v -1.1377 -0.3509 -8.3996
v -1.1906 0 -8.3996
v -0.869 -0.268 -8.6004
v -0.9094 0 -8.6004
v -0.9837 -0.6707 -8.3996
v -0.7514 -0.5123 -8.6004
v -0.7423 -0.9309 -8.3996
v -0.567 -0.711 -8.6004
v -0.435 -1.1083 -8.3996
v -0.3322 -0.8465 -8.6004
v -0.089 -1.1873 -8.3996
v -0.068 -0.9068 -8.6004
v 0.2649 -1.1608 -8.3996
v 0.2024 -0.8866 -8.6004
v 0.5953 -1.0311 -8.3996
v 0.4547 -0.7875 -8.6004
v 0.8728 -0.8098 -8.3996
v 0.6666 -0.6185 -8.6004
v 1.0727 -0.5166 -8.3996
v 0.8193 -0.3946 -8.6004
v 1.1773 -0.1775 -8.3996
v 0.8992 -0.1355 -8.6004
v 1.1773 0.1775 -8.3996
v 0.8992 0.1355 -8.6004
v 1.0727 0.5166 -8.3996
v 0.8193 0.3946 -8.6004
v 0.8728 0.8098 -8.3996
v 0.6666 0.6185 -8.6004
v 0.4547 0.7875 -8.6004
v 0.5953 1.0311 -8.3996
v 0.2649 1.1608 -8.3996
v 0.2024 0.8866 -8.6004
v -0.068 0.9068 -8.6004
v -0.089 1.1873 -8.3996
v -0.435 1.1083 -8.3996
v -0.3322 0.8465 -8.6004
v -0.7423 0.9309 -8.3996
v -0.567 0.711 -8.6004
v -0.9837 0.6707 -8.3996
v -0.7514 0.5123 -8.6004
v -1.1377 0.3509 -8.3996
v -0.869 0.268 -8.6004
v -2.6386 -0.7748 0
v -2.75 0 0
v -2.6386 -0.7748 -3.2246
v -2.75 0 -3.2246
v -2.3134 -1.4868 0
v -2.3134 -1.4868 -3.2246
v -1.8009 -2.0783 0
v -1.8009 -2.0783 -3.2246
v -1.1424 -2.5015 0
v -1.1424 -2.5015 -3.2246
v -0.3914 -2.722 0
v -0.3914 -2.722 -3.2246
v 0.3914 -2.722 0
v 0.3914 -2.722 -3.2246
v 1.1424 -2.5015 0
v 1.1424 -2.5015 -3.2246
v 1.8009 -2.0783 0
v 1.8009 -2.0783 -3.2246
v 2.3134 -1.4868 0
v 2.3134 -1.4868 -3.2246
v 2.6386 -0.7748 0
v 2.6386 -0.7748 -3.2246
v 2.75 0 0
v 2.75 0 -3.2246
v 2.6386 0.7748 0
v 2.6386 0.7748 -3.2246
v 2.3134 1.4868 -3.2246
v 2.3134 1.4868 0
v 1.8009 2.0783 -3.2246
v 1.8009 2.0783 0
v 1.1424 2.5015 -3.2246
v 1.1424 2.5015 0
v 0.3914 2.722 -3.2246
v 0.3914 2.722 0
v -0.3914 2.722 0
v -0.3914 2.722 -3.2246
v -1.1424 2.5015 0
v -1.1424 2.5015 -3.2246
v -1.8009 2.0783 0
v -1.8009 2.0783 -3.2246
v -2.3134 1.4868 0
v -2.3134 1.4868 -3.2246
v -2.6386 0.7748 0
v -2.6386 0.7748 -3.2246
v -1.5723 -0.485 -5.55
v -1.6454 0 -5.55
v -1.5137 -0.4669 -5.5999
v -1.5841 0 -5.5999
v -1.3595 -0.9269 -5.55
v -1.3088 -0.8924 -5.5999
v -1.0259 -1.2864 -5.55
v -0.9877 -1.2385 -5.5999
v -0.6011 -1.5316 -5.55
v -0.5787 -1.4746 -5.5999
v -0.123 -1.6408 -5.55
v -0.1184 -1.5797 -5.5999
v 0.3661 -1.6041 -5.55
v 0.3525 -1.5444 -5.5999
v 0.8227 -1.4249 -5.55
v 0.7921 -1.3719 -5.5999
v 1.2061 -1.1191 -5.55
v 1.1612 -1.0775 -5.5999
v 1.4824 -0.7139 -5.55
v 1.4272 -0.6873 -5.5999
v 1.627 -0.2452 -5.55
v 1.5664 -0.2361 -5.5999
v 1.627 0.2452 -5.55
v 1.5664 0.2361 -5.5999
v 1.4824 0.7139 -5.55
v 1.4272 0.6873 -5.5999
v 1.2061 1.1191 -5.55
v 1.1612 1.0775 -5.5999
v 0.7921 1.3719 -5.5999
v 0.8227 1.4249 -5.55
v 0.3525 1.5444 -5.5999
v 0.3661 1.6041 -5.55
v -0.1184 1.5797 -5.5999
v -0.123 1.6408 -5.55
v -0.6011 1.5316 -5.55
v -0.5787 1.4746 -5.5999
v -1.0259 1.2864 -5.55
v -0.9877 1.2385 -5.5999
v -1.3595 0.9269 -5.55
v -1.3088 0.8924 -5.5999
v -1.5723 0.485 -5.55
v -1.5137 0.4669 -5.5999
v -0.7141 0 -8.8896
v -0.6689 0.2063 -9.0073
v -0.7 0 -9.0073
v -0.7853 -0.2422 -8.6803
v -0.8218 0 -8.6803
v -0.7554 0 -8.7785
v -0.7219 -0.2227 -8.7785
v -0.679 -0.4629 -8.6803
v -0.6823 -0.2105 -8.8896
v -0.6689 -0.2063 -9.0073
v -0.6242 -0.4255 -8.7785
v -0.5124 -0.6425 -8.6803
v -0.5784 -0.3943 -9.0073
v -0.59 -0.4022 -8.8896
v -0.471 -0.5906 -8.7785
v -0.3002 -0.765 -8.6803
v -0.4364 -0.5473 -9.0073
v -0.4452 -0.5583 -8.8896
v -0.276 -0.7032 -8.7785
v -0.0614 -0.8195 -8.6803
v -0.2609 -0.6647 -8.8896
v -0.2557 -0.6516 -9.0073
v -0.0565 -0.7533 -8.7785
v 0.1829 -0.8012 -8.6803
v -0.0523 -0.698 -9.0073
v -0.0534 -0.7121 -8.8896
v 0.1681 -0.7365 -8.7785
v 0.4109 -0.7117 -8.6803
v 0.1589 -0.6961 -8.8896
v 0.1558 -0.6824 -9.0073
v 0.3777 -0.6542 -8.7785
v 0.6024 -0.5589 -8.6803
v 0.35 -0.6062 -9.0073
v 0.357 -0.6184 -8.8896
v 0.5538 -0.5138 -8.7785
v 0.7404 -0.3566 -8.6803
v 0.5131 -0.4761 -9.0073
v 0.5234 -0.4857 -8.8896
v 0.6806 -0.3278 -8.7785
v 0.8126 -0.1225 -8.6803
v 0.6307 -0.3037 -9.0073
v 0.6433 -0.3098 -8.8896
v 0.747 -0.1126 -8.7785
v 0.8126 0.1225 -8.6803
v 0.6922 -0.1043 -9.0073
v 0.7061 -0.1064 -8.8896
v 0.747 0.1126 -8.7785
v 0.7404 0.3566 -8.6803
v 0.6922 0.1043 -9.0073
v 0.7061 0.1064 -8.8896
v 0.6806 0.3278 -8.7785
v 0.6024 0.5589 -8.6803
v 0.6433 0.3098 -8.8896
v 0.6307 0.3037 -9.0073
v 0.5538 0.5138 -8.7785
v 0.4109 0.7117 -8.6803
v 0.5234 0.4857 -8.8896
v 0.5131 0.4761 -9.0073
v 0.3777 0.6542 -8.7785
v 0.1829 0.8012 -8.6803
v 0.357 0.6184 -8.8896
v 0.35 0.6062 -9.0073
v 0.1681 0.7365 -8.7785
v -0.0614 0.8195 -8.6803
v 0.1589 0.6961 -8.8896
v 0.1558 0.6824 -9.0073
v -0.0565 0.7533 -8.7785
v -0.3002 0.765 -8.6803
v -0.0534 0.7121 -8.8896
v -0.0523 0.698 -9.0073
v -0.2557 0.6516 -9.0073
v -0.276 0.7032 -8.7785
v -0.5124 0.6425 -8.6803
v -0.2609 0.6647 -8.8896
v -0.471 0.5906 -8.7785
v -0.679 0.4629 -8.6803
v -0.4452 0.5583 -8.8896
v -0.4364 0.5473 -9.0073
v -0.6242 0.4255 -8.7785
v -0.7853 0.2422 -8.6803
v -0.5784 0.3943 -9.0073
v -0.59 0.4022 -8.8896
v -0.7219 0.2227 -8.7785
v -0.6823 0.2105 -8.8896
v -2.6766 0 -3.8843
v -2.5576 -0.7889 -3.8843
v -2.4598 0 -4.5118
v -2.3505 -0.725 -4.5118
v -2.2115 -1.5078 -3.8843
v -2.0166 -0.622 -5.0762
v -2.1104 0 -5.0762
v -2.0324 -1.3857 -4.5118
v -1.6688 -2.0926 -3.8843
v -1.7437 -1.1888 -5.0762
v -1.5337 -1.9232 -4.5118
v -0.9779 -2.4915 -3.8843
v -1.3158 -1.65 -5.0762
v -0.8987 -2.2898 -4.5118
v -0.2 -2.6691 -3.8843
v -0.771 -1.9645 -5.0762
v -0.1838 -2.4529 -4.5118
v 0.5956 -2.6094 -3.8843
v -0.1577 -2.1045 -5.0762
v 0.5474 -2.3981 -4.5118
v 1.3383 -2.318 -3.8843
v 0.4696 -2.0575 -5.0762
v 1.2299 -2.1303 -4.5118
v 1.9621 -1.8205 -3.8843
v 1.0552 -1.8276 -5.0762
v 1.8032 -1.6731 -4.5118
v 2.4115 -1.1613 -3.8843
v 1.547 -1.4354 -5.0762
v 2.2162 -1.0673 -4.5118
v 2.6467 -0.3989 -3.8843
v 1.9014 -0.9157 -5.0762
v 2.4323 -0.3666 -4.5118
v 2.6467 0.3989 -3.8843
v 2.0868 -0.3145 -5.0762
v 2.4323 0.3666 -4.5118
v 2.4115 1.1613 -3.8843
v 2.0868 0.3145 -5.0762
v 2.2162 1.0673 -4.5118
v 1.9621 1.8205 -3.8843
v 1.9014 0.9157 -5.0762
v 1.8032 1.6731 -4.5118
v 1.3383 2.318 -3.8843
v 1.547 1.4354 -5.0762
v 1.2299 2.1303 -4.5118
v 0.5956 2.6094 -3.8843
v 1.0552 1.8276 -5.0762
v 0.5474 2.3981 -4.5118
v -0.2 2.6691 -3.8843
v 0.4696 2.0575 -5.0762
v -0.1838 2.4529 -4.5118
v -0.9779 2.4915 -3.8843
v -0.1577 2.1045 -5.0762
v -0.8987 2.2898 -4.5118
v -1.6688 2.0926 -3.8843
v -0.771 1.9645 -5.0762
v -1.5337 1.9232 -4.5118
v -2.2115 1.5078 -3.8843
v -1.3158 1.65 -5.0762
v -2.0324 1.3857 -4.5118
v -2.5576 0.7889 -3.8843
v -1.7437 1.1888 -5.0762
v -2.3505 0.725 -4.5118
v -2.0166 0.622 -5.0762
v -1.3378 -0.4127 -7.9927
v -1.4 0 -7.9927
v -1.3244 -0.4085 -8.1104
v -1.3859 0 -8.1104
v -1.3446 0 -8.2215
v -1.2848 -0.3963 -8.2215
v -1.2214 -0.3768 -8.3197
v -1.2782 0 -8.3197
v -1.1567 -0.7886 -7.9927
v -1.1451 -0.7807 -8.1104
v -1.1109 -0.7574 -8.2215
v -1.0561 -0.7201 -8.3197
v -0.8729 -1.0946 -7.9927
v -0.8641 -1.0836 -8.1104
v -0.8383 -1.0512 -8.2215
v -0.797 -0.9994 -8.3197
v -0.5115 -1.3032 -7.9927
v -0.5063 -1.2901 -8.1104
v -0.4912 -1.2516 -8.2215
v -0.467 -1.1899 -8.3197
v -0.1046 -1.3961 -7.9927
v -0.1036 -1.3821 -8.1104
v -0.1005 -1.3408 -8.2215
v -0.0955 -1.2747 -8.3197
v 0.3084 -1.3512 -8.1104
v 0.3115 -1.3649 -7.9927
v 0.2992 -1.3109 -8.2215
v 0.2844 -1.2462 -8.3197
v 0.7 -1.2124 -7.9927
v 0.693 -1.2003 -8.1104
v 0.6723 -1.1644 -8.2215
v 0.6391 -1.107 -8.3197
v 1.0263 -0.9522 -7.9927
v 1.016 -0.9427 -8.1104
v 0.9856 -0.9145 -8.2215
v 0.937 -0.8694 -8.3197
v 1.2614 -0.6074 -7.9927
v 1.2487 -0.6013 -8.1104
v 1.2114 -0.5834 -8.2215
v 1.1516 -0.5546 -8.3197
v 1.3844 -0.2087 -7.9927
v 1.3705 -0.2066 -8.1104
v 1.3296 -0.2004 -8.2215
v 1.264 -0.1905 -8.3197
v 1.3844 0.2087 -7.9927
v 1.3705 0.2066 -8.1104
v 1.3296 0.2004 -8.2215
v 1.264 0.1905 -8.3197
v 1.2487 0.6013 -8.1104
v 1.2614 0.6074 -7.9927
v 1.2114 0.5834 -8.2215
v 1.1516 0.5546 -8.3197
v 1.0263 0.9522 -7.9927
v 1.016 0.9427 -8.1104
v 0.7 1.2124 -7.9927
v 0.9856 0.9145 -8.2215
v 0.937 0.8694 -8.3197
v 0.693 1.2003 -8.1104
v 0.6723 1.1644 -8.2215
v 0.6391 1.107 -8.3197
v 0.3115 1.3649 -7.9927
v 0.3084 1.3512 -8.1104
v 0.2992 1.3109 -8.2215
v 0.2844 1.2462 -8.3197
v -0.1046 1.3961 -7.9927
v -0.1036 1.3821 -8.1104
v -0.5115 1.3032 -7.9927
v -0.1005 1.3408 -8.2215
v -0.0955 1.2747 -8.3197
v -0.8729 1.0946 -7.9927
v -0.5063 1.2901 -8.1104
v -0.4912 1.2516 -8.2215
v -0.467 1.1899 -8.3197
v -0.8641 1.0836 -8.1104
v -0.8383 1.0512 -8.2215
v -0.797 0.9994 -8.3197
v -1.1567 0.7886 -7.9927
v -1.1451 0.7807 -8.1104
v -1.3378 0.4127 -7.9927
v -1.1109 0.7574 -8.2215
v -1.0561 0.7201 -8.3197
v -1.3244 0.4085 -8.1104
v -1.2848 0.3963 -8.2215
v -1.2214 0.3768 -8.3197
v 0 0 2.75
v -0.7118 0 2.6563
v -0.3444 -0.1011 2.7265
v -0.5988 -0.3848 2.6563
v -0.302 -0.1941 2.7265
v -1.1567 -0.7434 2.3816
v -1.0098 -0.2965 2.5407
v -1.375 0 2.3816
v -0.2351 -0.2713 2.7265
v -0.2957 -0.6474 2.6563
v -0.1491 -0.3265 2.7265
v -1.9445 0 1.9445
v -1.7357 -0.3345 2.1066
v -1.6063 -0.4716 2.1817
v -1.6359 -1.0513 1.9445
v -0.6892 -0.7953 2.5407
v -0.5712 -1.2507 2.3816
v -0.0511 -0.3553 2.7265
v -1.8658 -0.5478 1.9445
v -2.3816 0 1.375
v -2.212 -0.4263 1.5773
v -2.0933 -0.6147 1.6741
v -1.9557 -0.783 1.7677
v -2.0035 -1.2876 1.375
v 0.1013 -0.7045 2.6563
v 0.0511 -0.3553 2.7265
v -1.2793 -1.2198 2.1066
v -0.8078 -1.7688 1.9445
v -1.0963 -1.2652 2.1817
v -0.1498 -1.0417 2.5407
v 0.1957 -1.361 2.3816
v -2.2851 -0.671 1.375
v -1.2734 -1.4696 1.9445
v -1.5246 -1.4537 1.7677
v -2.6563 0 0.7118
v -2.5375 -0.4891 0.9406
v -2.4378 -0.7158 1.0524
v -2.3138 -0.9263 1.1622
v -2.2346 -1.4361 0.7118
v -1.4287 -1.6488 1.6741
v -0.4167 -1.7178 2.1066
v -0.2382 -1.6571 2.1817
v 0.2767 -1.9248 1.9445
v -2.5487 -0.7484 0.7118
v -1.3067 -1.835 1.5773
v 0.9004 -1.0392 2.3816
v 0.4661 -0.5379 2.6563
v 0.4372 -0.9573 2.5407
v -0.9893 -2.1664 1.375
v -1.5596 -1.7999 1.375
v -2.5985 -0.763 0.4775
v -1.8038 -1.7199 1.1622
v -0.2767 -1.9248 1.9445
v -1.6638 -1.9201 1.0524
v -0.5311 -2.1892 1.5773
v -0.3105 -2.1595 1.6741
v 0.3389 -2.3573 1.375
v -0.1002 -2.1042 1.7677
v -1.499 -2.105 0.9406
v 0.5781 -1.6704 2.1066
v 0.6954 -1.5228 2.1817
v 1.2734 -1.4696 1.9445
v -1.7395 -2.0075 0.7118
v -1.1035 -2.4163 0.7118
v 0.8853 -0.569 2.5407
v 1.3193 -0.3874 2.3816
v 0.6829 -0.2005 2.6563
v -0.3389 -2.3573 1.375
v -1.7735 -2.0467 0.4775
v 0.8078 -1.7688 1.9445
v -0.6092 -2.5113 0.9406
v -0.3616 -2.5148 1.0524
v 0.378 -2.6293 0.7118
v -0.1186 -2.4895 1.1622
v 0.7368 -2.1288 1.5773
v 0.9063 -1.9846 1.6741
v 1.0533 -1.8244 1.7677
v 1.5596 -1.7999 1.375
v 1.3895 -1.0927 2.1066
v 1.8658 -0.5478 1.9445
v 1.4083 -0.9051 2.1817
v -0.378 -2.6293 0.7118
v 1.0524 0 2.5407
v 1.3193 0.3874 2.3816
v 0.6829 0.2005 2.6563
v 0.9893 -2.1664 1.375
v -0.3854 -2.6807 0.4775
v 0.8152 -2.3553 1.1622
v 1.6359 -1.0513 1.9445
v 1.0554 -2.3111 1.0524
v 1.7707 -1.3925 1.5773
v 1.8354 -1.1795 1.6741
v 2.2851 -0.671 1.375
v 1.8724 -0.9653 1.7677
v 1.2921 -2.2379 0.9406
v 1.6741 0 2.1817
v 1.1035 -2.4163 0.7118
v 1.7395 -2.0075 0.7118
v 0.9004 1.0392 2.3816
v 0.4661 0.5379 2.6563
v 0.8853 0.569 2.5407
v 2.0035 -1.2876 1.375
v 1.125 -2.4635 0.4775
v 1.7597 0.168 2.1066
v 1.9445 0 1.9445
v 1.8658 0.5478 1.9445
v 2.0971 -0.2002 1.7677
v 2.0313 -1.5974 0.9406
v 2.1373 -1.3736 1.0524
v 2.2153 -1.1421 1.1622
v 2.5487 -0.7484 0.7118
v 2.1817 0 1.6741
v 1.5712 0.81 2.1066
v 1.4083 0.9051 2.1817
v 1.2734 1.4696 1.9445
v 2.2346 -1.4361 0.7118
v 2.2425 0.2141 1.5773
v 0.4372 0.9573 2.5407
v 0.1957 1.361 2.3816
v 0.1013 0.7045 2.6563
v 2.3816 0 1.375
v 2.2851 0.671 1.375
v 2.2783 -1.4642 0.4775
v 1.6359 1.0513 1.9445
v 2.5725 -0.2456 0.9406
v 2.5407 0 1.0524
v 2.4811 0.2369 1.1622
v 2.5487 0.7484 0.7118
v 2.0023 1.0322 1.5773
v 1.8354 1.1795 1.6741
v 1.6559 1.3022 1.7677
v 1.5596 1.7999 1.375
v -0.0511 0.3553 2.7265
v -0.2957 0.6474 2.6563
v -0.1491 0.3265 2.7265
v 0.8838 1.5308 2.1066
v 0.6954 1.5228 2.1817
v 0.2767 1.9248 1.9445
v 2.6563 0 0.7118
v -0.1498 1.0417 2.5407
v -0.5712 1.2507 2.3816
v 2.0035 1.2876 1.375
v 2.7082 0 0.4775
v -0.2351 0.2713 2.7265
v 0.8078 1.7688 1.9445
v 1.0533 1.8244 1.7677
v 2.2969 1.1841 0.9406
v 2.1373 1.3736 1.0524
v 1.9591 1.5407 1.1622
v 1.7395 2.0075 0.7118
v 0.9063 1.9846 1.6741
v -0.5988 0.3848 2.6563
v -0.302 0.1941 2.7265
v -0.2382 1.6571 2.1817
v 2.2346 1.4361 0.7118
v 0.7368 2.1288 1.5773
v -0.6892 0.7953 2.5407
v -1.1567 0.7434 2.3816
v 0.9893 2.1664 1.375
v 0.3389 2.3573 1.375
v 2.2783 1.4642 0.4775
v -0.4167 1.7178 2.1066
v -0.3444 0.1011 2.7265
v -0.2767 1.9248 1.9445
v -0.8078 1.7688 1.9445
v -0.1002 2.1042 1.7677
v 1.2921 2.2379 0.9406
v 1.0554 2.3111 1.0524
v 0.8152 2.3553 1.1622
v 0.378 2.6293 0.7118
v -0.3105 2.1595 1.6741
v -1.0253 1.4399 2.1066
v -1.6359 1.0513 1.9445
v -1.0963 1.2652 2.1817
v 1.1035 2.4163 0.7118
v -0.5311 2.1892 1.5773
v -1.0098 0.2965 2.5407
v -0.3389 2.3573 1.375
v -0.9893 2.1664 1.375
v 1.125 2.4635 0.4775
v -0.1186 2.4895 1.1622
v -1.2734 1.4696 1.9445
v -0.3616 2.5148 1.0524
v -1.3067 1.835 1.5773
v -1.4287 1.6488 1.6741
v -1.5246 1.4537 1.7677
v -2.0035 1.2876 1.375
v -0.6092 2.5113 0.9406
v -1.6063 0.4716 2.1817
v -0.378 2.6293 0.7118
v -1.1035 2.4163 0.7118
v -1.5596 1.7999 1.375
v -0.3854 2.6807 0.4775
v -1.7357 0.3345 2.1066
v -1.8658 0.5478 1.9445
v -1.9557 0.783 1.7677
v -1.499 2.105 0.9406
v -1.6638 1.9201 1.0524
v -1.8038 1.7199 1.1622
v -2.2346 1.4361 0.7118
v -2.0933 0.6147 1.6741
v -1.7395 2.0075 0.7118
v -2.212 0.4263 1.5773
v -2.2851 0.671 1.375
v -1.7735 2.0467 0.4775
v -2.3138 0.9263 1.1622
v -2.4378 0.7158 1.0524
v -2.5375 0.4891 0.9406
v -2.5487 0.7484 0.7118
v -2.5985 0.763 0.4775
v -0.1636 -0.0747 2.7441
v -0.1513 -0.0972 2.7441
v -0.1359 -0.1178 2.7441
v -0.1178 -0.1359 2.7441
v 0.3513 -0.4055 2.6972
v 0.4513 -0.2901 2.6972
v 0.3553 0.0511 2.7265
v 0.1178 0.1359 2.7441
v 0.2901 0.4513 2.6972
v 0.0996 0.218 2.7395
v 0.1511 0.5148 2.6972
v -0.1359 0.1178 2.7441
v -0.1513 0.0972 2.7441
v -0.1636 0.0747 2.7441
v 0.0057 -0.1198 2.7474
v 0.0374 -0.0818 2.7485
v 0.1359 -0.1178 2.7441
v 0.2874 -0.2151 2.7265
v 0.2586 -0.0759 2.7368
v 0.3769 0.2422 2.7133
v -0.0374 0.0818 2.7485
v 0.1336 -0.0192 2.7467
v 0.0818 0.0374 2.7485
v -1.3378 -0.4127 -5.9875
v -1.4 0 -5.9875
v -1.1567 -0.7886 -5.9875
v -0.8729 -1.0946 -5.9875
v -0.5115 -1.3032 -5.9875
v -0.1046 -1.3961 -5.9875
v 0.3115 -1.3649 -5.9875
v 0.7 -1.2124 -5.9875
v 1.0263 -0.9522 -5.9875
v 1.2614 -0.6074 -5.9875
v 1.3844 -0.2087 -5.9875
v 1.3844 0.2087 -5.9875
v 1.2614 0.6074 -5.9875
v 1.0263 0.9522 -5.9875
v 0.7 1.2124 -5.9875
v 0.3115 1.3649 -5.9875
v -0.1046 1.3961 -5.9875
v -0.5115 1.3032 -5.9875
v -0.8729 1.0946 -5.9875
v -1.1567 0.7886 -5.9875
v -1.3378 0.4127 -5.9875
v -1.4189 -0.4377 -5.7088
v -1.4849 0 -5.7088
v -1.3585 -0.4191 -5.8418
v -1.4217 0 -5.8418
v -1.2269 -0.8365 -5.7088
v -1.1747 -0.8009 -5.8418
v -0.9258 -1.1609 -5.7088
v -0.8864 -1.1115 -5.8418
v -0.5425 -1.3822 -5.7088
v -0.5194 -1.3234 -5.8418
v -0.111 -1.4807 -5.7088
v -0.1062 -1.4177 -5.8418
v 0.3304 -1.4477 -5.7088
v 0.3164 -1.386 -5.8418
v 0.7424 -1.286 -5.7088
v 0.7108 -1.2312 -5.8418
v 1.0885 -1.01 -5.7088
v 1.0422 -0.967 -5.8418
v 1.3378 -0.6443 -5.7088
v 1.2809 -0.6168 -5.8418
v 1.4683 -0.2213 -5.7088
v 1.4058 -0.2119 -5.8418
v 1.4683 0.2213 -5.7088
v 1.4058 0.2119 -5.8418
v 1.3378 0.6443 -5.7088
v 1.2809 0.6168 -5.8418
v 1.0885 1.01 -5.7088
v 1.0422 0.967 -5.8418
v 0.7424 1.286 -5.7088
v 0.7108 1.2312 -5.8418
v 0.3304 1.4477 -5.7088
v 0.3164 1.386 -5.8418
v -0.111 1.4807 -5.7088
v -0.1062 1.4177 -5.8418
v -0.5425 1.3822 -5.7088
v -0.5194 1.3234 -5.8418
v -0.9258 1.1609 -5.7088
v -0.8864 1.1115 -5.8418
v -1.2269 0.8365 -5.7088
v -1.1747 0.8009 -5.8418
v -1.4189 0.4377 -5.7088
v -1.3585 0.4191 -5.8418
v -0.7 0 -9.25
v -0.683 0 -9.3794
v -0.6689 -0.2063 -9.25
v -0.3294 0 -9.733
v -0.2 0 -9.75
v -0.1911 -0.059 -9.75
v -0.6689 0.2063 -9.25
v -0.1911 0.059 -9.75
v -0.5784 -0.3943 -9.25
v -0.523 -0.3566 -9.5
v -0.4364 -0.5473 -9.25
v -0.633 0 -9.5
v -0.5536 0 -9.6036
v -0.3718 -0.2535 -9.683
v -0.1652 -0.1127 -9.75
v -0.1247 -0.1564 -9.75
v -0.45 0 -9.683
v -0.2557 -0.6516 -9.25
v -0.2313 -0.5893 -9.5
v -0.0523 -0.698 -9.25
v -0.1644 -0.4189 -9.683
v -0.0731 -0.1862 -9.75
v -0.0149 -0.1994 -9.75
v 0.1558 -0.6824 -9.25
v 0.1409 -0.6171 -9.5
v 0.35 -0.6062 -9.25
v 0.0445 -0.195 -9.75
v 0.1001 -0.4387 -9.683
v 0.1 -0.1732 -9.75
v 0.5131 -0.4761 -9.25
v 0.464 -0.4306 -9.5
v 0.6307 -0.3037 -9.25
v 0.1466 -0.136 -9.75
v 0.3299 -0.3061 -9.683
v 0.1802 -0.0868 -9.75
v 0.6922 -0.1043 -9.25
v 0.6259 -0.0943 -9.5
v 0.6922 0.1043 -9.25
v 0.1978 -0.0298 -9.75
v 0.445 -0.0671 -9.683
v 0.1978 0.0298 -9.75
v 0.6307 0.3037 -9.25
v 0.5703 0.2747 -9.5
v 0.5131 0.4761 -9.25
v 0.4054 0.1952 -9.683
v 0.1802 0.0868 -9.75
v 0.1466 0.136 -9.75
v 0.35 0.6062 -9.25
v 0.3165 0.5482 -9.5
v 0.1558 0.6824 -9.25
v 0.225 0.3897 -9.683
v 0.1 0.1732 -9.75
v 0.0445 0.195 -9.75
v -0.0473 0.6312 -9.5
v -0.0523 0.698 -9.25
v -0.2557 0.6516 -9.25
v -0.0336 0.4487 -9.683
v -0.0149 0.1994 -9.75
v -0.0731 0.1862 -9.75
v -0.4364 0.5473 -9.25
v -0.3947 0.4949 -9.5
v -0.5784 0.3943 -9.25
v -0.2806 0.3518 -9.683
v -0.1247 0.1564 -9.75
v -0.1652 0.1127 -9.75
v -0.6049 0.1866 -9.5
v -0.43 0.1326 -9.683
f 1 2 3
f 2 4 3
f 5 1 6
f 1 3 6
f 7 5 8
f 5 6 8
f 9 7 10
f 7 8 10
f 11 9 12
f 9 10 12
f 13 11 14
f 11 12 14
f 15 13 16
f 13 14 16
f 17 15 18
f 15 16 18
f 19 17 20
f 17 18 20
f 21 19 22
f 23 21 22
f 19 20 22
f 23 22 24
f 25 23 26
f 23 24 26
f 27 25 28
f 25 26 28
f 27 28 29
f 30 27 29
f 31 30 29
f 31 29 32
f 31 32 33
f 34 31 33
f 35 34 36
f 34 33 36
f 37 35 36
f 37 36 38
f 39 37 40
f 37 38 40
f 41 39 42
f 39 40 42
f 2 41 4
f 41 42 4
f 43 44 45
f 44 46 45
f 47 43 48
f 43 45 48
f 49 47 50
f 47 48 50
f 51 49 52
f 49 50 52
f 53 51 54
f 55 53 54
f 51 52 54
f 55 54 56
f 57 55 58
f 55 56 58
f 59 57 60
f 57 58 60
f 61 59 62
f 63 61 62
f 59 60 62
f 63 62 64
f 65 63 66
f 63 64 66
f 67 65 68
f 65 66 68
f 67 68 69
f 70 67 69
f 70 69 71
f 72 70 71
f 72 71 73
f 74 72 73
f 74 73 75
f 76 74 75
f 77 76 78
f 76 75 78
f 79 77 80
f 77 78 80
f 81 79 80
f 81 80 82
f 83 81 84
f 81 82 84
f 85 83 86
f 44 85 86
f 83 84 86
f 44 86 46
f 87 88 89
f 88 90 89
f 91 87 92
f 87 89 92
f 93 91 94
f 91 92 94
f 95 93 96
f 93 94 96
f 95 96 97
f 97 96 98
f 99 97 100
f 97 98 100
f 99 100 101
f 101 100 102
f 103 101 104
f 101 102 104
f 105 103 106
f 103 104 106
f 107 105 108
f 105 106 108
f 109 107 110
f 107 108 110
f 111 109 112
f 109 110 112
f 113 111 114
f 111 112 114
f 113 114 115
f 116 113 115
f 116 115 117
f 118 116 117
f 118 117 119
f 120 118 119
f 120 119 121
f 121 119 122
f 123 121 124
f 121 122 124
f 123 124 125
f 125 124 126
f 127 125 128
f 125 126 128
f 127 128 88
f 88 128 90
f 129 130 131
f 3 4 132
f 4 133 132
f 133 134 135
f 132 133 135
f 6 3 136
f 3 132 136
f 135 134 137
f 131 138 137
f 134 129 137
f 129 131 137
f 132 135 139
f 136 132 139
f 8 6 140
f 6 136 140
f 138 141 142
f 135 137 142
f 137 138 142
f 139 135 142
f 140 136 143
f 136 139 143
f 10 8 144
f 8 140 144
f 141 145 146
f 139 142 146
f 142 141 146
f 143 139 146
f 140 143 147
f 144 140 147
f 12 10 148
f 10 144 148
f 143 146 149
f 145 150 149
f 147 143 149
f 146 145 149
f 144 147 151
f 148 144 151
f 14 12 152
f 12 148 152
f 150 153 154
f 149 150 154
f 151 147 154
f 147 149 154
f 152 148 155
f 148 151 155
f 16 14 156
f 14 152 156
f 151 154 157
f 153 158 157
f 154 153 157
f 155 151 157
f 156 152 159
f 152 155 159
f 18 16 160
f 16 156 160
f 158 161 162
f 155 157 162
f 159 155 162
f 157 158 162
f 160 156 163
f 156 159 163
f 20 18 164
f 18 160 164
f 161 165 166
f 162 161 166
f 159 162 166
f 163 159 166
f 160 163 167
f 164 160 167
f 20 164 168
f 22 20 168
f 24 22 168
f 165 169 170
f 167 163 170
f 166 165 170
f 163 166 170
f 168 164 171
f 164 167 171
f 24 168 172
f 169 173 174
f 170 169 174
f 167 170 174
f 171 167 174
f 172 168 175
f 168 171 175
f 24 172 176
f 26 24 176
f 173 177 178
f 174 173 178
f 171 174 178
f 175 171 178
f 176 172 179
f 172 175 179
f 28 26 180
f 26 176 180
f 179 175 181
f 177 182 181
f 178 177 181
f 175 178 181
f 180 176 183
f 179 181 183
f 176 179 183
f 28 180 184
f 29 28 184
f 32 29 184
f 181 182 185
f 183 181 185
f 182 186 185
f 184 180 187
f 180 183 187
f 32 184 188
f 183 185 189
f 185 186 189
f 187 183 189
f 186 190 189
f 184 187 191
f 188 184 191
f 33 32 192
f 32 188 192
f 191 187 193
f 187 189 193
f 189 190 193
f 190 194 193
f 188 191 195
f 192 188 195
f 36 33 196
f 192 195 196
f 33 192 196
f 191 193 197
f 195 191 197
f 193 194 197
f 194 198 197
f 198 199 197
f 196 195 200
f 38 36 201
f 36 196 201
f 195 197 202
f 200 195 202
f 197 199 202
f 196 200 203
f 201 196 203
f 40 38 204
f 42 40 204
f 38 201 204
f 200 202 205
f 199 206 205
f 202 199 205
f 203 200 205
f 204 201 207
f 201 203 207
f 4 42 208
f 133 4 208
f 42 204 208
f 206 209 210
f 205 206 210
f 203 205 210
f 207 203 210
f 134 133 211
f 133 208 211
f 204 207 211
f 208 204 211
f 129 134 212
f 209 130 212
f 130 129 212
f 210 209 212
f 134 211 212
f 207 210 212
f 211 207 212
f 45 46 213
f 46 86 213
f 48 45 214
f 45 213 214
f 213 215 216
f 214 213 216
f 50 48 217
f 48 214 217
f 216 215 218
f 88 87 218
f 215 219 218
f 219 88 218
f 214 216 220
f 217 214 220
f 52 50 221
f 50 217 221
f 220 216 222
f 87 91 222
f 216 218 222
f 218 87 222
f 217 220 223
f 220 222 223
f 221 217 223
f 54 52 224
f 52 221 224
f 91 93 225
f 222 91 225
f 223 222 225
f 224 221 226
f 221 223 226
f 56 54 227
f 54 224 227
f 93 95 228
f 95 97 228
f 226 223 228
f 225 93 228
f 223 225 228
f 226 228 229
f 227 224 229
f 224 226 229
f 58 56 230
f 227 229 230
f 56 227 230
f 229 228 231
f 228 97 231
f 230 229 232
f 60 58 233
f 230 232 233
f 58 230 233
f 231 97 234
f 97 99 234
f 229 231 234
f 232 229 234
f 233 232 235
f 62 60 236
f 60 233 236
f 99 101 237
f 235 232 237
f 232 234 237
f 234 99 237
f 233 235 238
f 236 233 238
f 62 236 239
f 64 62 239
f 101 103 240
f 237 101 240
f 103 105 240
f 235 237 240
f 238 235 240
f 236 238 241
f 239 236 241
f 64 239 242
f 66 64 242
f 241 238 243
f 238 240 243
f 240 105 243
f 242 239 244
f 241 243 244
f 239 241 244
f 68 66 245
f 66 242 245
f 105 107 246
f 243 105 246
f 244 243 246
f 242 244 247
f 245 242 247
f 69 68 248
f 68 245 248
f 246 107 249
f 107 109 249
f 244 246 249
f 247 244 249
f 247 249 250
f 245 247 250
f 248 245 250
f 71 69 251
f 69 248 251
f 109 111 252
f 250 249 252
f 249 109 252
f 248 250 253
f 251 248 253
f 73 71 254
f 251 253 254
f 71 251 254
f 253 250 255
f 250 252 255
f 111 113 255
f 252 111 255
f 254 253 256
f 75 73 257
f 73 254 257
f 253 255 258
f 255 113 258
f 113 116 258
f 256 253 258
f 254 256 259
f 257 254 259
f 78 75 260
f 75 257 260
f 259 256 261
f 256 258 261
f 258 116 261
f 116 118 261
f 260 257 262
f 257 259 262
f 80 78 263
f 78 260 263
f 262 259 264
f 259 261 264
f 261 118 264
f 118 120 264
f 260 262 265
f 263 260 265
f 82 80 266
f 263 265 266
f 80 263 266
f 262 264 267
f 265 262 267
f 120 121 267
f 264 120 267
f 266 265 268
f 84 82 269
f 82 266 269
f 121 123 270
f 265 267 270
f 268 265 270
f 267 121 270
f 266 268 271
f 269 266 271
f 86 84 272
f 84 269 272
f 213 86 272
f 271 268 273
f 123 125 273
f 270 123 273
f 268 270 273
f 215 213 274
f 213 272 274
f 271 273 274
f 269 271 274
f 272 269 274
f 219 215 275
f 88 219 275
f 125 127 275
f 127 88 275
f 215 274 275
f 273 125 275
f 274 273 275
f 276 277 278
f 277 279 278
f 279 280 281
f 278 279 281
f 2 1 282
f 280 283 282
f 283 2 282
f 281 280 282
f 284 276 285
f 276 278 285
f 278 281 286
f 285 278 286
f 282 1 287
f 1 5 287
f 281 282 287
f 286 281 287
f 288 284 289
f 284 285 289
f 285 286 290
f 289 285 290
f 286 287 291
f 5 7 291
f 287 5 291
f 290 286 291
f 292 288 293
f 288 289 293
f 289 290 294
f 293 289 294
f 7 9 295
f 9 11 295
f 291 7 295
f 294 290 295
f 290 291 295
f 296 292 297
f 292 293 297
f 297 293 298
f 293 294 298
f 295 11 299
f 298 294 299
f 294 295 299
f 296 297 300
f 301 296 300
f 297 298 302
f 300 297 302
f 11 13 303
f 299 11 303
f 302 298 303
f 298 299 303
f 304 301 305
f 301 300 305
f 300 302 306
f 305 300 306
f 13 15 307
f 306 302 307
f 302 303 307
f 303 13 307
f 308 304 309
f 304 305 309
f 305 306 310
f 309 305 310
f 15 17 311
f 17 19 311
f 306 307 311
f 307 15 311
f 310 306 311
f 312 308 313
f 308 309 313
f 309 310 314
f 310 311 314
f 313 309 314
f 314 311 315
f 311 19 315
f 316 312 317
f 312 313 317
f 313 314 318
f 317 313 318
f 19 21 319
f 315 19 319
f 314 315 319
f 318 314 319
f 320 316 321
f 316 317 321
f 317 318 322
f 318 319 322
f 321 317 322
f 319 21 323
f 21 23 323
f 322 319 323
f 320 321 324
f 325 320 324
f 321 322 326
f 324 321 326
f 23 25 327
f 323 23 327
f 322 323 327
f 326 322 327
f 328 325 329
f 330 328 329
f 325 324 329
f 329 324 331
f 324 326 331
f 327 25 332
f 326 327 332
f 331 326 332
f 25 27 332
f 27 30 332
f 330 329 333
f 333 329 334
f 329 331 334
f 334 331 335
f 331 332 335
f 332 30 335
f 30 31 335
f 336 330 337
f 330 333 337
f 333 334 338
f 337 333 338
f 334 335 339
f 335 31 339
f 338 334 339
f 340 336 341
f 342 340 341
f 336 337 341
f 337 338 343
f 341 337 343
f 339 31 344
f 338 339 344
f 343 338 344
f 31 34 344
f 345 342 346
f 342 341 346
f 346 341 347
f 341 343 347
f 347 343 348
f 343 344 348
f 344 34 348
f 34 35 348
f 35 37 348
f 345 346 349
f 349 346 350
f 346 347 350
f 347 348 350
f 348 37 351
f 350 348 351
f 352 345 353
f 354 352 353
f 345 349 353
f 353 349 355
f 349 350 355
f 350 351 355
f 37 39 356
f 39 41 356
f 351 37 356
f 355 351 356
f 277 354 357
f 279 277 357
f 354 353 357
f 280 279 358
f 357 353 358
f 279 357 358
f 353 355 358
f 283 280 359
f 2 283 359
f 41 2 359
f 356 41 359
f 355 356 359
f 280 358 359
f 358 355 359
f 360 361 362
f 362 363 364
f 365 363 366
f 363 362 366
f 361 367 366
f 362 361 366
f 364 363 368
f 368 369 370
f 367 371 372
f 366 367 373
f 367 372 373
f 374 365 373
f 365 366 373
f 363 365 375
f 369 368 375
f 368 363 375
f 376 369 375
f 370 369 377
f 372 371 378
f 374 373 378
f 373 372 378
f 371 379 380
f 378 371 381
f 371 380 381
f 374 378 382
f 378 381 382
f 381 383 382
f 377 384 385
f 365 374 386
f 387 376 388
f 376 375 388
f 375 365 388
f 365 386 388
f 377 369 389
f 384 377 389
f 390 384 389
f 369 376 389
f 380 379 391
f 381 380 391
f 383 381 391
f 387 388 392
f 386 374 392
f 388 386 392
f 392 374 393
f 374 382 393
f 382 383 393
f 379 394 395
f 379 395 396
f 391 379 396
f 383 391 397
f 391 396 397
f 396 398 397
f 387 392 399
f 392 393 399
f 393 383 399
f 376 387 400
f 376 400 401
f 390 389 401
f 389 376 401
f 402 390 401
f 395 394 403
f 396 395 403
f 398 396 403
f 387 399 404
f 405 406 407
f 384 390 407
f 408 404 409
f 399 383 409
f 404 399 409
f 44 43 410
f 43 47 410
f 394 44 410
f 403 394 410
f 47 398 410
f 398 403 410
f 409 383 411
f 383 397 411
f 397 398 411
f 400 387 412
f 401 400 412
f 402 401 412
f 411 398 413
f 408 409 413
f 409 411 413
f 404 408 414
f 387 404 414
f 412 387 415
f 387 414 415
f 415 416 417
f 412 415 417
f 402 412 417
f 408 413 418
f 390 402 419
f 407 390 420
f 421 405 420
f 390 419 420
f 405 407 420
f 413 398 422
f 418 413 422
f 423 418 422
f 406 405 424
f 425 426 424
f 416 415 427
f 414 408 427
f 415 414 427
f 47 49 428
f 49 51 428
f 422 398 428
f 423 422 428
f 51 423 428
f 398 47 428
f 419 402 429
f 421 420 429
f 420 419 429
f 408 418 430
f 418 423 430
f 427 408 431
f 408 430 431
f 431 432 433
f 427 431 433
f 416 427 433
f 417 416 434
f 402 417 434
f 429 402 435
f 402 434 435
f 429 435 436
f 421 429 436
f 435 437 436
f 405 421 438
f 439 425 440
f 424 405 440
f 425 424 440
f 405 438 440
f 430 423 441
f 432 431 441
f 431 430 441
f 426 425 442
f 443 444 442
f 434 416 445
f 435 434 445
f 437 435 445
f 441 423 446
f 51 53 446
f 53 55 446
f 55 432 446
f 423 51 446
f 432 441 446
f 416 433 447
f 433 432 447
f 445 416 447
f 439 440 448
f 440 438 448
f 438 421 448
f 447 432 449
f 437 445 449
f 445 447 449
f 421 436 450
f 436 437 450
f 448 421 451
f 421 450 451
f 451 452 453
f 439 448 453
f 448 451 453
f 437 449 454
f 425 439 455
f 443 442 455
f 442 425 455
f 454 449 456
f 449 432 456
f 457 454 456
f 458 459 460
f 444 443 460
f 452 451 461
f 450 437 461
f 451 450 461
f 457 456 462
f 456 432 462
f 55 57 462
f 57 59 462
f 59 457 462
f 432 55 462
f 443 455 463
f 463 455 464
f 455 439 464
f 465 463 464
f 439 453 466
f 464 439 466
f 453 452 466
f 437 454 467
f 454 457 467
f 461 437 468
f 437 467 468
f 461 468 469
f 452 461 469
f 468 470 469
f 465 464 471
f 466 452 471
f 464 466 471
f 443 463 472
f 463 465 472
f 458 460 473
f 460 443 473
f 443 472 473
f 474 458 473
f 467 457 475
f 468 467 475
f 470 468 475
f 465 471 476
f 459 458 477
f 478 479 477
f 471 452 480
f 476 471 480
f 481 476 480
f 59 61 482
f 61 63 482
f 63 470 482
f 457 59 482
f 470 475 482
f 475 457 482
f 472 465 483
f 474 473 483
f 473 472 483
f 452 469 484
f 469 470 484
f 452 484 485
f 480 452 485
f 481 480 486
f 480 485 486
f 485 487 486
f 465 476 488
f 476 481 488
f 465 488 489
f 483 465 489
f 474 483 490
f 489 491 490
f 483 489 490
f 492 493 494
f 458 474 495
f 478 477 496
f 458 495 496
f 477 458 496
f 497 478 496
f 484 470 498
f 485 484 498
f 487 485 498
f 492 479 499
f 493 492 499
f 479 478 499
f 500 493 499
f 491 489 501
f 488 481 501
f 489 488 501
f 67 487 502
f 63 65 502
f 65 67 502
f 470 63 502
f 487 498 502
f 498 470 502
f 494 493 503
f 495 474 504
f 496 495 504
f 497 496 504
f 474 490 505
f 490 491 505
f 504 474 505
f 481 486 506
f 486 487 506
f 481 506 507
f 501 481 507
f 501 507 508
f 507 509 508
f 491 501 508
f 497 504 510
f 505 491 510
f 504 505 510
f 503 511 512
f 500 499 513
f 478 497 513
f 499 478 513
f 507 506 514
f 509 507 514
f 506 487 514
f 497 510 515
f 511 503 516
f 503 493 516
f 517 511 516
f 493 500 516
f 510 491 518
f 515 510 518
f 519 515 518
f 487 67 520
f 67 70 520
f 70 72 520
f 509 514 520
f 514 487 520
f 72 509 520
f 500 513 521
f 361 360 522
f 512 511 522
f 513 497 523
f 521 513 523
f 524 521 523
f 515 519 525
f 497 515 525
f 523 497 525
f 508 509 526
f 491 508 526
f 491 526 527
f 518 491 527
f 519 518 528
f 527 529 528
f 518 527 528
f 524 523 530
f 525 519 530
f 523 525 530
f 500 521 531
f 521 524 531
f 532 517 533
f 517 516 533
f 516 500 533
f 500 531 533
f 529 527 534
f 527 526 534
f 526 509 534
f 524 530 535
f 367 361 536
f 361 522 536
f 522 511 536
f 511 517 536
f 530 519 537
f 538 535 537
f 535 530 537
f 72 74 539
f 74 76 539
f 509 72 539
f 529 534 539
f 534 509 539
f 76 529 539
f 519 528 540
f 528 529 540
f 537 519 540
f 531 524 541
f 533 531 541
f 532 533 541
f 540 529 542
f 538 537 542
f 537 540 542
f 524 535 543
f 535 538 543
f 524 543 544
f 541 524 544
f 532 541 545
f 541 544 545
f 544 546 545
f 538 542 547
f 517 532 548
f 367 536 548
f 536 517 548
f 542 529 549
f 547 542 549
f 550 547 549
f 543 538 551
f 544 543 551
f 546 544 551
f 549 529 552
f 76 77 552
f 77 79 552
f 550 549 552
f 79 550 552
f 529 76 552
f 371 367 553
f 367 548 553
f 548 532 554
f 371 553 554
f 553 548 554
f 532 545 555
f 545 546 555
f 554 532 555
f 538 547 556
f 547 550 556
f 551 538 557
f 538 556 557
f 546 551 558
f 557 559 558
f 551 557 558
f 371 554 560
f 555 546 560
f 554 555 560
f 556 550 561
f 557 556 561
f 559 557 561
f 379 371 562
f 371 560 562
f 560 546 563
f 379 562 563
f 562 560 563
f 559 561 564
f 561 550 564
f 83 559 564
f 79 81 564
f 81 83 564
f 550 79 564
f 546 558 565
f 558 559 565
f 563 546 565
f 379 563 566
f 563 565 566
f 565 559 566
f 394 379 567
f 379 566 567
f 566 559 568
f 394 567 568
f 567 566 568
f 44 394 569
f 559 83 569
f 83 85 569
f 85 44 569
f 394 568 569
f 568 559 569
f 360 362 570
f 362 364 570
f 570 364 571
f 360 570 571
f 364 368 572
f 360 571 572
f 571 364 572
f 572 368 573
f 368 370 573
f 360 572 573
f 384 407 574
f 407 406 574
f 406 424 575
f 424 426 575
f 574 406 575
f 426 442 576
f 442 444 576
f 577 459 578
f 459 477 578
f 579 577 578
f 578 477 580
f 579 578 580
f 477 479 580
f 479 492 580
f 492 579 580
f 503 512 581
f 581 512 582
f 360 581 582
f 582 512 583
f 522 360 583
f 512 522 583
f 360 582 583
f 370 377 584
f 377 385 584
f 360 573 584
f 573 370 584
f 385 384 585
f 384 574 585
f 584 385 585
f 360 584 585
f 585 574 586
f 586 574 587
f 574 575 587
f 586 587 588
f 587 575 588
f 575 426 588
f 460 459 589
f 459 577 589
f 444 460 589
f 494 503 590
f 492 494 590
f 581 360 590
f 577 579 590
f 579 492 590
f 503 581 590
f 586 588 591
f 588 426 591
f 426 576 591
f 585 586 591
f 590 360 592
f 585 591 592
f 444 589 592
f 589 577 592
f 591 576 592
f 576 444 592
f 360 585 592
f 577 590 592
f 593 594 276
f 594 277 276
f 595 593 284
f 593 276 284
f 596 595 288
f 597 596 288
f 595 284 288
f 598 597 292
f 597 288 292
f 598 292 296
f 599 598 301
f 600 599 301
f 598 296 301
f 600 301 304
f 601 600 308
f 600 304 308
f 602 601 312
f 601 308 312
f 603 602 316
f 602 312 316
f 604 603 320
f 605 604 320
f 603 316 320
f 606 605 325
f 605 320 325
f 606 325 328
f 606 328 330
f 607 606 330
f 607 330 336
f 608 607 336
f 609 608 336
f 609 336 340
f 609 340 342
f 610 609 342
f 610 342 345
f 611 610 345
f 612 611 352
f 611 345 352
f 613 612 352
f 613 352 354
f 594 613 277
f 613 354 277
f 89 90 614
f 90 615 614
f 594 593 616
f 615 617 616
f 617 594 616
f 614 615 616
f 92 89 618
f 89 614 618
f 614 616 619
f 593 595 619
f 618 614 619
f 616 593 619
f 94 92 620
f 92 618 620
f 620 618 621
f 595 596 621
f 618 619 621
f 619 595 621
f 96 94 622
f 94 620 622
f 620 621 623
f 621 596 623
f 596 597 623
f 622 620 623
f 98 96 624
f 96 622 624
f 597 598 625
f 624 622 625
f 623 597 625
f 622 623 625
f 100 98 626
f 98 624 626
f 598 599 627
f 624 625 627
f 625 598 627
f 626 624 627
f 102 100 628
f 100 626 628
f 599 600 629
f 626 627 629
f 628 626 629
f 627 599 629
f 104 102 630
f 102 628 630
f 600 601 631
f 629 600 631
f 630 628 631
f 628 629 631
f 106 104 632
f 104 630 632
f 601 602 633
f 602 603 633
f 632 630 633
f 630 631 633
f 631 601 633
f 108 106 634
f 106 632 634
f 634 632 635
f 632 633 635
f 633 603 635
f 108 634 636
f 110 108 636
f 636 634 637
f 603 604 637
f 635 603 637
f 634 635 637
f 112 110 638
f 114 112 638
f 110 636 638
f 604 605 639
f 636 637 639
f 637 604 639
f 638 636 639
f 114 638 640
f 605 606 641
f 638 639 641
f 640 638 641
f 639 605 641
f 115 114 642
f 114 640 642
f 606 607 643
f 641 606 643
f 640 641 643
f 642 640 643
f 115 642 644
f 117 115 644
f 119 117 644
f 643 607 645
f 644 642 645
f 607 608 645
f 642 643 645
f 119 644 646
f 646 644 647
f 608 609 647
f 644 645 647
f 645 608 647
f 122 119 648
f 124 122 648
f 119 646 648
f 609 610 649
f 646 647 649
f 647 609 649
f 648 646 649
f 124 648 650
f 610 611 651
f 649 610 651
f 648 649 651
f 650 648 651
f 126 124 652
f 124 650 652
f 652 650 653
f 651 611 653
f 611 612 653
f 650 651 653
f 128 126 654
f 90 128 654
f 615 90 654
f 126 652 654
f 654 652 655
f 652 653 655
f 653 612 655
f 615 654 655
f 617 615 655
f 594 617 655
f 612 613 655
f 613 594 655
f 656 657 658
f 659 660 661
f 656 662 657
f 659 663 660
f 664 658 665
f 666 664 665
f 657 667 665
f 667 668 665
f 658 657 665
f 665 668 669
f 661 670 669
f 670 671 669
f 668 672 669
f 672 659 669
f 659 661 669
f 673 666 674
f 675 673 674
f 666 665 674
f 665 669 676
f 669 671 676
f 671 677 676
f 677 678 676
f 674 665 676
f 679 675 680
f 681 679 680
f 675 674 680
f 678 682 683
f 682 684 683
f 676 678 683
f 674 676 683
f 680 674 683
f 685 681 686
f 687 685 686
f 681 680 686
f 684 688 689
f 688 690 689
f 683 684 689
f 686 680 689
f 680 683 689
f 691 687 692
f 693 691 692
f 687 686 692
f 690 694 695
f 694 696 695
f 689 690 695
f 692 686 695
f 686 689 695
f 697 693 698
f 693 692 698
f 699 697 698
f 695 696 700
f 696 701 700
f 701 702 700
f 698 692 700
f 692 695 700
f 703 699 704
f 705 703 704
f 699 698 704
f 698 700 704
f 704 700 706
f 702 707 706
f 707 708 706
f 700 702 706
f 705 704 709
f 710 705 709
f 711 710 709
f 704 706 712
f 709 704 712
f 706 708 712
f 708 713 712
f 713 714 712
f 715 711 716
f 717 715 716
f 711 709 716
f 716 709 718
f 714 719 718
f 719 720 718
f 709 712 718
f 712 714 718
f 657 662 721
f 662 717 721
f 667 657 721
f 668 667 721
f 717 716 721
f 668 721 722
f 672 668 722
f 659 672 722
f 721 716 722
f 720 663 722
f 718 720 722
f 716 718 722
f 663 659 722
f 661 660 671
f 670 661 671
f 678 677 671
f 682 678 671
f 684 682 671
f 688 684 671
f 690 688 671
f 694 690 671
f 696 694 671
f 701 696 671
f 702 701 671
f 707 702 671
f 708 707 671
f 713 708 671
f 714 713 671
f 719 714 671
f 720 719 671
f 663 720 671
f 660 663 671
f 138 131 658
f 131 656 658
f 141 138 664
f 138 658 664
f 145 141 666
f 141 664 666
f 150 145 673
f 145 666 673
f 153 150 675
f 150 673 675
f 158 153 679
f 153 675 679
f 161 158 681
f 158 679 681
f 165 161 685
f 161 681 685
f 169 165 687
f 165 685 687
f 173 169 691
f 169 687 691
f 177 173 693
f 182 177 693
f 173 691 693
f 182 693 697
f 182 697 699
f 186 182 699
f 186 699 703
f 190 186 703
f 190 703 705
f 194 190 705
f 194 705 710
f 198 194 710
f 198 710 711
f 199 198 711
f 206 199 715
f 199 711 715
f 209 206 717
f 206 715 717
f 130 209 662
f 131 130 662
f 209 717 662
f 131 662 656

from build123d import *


with BuildPart() as f1:
    # F0 (on Front) → F1 (revolve)
    with BuildSketch(Plane.XZ):
        with BuildLine():
            Line((0, -9.75), (0, -2.75))
            Line((0, -2.75), (0, 2.75))
            ThreePointArc((0, 2.75), (-1.944544, 1.944544), (-2.75, 0))
            Line((-2.75, 0), (-2.75, -3.224587))
            ThreePointArc((-2.75, -3.224587), (-2.459809, -4.511807), (-1.645377, -5.55))
            Line((-1.645377, -5.55), (-1.584104, -5.599942))
            ThreePointArc((-1.584104, -5.599942), (-1.448365, -5.772975), (-1.4, -5.987511))
            Line((-1.4, -5.987511), (-1.4, -7.992691))
            ThreePointArc((-1.4, -7.992691), (-1.344584, -8.221482), (-1.190619, -8.399558))
            Line((-1.190619, -8.399558), (-0.909381, -8.600442))
            ThreePointArc((-0.909381, -8.600442), (-0.755416, -8.778518), (-0.7, -9.007309))
            Line((-0.7, -9.007309), (-0.7, -9.25))
            ThreePointArc((-0.7, -9.25), (-0.553553, -9.603553), (-0.2, -9.75))
            Line((-0.2, -9.75), (0, -9.75))
        make_face()
    revolve(axis=Axis((0, 0, -3.5), (0, 0, 1)))


solid = f1.part
